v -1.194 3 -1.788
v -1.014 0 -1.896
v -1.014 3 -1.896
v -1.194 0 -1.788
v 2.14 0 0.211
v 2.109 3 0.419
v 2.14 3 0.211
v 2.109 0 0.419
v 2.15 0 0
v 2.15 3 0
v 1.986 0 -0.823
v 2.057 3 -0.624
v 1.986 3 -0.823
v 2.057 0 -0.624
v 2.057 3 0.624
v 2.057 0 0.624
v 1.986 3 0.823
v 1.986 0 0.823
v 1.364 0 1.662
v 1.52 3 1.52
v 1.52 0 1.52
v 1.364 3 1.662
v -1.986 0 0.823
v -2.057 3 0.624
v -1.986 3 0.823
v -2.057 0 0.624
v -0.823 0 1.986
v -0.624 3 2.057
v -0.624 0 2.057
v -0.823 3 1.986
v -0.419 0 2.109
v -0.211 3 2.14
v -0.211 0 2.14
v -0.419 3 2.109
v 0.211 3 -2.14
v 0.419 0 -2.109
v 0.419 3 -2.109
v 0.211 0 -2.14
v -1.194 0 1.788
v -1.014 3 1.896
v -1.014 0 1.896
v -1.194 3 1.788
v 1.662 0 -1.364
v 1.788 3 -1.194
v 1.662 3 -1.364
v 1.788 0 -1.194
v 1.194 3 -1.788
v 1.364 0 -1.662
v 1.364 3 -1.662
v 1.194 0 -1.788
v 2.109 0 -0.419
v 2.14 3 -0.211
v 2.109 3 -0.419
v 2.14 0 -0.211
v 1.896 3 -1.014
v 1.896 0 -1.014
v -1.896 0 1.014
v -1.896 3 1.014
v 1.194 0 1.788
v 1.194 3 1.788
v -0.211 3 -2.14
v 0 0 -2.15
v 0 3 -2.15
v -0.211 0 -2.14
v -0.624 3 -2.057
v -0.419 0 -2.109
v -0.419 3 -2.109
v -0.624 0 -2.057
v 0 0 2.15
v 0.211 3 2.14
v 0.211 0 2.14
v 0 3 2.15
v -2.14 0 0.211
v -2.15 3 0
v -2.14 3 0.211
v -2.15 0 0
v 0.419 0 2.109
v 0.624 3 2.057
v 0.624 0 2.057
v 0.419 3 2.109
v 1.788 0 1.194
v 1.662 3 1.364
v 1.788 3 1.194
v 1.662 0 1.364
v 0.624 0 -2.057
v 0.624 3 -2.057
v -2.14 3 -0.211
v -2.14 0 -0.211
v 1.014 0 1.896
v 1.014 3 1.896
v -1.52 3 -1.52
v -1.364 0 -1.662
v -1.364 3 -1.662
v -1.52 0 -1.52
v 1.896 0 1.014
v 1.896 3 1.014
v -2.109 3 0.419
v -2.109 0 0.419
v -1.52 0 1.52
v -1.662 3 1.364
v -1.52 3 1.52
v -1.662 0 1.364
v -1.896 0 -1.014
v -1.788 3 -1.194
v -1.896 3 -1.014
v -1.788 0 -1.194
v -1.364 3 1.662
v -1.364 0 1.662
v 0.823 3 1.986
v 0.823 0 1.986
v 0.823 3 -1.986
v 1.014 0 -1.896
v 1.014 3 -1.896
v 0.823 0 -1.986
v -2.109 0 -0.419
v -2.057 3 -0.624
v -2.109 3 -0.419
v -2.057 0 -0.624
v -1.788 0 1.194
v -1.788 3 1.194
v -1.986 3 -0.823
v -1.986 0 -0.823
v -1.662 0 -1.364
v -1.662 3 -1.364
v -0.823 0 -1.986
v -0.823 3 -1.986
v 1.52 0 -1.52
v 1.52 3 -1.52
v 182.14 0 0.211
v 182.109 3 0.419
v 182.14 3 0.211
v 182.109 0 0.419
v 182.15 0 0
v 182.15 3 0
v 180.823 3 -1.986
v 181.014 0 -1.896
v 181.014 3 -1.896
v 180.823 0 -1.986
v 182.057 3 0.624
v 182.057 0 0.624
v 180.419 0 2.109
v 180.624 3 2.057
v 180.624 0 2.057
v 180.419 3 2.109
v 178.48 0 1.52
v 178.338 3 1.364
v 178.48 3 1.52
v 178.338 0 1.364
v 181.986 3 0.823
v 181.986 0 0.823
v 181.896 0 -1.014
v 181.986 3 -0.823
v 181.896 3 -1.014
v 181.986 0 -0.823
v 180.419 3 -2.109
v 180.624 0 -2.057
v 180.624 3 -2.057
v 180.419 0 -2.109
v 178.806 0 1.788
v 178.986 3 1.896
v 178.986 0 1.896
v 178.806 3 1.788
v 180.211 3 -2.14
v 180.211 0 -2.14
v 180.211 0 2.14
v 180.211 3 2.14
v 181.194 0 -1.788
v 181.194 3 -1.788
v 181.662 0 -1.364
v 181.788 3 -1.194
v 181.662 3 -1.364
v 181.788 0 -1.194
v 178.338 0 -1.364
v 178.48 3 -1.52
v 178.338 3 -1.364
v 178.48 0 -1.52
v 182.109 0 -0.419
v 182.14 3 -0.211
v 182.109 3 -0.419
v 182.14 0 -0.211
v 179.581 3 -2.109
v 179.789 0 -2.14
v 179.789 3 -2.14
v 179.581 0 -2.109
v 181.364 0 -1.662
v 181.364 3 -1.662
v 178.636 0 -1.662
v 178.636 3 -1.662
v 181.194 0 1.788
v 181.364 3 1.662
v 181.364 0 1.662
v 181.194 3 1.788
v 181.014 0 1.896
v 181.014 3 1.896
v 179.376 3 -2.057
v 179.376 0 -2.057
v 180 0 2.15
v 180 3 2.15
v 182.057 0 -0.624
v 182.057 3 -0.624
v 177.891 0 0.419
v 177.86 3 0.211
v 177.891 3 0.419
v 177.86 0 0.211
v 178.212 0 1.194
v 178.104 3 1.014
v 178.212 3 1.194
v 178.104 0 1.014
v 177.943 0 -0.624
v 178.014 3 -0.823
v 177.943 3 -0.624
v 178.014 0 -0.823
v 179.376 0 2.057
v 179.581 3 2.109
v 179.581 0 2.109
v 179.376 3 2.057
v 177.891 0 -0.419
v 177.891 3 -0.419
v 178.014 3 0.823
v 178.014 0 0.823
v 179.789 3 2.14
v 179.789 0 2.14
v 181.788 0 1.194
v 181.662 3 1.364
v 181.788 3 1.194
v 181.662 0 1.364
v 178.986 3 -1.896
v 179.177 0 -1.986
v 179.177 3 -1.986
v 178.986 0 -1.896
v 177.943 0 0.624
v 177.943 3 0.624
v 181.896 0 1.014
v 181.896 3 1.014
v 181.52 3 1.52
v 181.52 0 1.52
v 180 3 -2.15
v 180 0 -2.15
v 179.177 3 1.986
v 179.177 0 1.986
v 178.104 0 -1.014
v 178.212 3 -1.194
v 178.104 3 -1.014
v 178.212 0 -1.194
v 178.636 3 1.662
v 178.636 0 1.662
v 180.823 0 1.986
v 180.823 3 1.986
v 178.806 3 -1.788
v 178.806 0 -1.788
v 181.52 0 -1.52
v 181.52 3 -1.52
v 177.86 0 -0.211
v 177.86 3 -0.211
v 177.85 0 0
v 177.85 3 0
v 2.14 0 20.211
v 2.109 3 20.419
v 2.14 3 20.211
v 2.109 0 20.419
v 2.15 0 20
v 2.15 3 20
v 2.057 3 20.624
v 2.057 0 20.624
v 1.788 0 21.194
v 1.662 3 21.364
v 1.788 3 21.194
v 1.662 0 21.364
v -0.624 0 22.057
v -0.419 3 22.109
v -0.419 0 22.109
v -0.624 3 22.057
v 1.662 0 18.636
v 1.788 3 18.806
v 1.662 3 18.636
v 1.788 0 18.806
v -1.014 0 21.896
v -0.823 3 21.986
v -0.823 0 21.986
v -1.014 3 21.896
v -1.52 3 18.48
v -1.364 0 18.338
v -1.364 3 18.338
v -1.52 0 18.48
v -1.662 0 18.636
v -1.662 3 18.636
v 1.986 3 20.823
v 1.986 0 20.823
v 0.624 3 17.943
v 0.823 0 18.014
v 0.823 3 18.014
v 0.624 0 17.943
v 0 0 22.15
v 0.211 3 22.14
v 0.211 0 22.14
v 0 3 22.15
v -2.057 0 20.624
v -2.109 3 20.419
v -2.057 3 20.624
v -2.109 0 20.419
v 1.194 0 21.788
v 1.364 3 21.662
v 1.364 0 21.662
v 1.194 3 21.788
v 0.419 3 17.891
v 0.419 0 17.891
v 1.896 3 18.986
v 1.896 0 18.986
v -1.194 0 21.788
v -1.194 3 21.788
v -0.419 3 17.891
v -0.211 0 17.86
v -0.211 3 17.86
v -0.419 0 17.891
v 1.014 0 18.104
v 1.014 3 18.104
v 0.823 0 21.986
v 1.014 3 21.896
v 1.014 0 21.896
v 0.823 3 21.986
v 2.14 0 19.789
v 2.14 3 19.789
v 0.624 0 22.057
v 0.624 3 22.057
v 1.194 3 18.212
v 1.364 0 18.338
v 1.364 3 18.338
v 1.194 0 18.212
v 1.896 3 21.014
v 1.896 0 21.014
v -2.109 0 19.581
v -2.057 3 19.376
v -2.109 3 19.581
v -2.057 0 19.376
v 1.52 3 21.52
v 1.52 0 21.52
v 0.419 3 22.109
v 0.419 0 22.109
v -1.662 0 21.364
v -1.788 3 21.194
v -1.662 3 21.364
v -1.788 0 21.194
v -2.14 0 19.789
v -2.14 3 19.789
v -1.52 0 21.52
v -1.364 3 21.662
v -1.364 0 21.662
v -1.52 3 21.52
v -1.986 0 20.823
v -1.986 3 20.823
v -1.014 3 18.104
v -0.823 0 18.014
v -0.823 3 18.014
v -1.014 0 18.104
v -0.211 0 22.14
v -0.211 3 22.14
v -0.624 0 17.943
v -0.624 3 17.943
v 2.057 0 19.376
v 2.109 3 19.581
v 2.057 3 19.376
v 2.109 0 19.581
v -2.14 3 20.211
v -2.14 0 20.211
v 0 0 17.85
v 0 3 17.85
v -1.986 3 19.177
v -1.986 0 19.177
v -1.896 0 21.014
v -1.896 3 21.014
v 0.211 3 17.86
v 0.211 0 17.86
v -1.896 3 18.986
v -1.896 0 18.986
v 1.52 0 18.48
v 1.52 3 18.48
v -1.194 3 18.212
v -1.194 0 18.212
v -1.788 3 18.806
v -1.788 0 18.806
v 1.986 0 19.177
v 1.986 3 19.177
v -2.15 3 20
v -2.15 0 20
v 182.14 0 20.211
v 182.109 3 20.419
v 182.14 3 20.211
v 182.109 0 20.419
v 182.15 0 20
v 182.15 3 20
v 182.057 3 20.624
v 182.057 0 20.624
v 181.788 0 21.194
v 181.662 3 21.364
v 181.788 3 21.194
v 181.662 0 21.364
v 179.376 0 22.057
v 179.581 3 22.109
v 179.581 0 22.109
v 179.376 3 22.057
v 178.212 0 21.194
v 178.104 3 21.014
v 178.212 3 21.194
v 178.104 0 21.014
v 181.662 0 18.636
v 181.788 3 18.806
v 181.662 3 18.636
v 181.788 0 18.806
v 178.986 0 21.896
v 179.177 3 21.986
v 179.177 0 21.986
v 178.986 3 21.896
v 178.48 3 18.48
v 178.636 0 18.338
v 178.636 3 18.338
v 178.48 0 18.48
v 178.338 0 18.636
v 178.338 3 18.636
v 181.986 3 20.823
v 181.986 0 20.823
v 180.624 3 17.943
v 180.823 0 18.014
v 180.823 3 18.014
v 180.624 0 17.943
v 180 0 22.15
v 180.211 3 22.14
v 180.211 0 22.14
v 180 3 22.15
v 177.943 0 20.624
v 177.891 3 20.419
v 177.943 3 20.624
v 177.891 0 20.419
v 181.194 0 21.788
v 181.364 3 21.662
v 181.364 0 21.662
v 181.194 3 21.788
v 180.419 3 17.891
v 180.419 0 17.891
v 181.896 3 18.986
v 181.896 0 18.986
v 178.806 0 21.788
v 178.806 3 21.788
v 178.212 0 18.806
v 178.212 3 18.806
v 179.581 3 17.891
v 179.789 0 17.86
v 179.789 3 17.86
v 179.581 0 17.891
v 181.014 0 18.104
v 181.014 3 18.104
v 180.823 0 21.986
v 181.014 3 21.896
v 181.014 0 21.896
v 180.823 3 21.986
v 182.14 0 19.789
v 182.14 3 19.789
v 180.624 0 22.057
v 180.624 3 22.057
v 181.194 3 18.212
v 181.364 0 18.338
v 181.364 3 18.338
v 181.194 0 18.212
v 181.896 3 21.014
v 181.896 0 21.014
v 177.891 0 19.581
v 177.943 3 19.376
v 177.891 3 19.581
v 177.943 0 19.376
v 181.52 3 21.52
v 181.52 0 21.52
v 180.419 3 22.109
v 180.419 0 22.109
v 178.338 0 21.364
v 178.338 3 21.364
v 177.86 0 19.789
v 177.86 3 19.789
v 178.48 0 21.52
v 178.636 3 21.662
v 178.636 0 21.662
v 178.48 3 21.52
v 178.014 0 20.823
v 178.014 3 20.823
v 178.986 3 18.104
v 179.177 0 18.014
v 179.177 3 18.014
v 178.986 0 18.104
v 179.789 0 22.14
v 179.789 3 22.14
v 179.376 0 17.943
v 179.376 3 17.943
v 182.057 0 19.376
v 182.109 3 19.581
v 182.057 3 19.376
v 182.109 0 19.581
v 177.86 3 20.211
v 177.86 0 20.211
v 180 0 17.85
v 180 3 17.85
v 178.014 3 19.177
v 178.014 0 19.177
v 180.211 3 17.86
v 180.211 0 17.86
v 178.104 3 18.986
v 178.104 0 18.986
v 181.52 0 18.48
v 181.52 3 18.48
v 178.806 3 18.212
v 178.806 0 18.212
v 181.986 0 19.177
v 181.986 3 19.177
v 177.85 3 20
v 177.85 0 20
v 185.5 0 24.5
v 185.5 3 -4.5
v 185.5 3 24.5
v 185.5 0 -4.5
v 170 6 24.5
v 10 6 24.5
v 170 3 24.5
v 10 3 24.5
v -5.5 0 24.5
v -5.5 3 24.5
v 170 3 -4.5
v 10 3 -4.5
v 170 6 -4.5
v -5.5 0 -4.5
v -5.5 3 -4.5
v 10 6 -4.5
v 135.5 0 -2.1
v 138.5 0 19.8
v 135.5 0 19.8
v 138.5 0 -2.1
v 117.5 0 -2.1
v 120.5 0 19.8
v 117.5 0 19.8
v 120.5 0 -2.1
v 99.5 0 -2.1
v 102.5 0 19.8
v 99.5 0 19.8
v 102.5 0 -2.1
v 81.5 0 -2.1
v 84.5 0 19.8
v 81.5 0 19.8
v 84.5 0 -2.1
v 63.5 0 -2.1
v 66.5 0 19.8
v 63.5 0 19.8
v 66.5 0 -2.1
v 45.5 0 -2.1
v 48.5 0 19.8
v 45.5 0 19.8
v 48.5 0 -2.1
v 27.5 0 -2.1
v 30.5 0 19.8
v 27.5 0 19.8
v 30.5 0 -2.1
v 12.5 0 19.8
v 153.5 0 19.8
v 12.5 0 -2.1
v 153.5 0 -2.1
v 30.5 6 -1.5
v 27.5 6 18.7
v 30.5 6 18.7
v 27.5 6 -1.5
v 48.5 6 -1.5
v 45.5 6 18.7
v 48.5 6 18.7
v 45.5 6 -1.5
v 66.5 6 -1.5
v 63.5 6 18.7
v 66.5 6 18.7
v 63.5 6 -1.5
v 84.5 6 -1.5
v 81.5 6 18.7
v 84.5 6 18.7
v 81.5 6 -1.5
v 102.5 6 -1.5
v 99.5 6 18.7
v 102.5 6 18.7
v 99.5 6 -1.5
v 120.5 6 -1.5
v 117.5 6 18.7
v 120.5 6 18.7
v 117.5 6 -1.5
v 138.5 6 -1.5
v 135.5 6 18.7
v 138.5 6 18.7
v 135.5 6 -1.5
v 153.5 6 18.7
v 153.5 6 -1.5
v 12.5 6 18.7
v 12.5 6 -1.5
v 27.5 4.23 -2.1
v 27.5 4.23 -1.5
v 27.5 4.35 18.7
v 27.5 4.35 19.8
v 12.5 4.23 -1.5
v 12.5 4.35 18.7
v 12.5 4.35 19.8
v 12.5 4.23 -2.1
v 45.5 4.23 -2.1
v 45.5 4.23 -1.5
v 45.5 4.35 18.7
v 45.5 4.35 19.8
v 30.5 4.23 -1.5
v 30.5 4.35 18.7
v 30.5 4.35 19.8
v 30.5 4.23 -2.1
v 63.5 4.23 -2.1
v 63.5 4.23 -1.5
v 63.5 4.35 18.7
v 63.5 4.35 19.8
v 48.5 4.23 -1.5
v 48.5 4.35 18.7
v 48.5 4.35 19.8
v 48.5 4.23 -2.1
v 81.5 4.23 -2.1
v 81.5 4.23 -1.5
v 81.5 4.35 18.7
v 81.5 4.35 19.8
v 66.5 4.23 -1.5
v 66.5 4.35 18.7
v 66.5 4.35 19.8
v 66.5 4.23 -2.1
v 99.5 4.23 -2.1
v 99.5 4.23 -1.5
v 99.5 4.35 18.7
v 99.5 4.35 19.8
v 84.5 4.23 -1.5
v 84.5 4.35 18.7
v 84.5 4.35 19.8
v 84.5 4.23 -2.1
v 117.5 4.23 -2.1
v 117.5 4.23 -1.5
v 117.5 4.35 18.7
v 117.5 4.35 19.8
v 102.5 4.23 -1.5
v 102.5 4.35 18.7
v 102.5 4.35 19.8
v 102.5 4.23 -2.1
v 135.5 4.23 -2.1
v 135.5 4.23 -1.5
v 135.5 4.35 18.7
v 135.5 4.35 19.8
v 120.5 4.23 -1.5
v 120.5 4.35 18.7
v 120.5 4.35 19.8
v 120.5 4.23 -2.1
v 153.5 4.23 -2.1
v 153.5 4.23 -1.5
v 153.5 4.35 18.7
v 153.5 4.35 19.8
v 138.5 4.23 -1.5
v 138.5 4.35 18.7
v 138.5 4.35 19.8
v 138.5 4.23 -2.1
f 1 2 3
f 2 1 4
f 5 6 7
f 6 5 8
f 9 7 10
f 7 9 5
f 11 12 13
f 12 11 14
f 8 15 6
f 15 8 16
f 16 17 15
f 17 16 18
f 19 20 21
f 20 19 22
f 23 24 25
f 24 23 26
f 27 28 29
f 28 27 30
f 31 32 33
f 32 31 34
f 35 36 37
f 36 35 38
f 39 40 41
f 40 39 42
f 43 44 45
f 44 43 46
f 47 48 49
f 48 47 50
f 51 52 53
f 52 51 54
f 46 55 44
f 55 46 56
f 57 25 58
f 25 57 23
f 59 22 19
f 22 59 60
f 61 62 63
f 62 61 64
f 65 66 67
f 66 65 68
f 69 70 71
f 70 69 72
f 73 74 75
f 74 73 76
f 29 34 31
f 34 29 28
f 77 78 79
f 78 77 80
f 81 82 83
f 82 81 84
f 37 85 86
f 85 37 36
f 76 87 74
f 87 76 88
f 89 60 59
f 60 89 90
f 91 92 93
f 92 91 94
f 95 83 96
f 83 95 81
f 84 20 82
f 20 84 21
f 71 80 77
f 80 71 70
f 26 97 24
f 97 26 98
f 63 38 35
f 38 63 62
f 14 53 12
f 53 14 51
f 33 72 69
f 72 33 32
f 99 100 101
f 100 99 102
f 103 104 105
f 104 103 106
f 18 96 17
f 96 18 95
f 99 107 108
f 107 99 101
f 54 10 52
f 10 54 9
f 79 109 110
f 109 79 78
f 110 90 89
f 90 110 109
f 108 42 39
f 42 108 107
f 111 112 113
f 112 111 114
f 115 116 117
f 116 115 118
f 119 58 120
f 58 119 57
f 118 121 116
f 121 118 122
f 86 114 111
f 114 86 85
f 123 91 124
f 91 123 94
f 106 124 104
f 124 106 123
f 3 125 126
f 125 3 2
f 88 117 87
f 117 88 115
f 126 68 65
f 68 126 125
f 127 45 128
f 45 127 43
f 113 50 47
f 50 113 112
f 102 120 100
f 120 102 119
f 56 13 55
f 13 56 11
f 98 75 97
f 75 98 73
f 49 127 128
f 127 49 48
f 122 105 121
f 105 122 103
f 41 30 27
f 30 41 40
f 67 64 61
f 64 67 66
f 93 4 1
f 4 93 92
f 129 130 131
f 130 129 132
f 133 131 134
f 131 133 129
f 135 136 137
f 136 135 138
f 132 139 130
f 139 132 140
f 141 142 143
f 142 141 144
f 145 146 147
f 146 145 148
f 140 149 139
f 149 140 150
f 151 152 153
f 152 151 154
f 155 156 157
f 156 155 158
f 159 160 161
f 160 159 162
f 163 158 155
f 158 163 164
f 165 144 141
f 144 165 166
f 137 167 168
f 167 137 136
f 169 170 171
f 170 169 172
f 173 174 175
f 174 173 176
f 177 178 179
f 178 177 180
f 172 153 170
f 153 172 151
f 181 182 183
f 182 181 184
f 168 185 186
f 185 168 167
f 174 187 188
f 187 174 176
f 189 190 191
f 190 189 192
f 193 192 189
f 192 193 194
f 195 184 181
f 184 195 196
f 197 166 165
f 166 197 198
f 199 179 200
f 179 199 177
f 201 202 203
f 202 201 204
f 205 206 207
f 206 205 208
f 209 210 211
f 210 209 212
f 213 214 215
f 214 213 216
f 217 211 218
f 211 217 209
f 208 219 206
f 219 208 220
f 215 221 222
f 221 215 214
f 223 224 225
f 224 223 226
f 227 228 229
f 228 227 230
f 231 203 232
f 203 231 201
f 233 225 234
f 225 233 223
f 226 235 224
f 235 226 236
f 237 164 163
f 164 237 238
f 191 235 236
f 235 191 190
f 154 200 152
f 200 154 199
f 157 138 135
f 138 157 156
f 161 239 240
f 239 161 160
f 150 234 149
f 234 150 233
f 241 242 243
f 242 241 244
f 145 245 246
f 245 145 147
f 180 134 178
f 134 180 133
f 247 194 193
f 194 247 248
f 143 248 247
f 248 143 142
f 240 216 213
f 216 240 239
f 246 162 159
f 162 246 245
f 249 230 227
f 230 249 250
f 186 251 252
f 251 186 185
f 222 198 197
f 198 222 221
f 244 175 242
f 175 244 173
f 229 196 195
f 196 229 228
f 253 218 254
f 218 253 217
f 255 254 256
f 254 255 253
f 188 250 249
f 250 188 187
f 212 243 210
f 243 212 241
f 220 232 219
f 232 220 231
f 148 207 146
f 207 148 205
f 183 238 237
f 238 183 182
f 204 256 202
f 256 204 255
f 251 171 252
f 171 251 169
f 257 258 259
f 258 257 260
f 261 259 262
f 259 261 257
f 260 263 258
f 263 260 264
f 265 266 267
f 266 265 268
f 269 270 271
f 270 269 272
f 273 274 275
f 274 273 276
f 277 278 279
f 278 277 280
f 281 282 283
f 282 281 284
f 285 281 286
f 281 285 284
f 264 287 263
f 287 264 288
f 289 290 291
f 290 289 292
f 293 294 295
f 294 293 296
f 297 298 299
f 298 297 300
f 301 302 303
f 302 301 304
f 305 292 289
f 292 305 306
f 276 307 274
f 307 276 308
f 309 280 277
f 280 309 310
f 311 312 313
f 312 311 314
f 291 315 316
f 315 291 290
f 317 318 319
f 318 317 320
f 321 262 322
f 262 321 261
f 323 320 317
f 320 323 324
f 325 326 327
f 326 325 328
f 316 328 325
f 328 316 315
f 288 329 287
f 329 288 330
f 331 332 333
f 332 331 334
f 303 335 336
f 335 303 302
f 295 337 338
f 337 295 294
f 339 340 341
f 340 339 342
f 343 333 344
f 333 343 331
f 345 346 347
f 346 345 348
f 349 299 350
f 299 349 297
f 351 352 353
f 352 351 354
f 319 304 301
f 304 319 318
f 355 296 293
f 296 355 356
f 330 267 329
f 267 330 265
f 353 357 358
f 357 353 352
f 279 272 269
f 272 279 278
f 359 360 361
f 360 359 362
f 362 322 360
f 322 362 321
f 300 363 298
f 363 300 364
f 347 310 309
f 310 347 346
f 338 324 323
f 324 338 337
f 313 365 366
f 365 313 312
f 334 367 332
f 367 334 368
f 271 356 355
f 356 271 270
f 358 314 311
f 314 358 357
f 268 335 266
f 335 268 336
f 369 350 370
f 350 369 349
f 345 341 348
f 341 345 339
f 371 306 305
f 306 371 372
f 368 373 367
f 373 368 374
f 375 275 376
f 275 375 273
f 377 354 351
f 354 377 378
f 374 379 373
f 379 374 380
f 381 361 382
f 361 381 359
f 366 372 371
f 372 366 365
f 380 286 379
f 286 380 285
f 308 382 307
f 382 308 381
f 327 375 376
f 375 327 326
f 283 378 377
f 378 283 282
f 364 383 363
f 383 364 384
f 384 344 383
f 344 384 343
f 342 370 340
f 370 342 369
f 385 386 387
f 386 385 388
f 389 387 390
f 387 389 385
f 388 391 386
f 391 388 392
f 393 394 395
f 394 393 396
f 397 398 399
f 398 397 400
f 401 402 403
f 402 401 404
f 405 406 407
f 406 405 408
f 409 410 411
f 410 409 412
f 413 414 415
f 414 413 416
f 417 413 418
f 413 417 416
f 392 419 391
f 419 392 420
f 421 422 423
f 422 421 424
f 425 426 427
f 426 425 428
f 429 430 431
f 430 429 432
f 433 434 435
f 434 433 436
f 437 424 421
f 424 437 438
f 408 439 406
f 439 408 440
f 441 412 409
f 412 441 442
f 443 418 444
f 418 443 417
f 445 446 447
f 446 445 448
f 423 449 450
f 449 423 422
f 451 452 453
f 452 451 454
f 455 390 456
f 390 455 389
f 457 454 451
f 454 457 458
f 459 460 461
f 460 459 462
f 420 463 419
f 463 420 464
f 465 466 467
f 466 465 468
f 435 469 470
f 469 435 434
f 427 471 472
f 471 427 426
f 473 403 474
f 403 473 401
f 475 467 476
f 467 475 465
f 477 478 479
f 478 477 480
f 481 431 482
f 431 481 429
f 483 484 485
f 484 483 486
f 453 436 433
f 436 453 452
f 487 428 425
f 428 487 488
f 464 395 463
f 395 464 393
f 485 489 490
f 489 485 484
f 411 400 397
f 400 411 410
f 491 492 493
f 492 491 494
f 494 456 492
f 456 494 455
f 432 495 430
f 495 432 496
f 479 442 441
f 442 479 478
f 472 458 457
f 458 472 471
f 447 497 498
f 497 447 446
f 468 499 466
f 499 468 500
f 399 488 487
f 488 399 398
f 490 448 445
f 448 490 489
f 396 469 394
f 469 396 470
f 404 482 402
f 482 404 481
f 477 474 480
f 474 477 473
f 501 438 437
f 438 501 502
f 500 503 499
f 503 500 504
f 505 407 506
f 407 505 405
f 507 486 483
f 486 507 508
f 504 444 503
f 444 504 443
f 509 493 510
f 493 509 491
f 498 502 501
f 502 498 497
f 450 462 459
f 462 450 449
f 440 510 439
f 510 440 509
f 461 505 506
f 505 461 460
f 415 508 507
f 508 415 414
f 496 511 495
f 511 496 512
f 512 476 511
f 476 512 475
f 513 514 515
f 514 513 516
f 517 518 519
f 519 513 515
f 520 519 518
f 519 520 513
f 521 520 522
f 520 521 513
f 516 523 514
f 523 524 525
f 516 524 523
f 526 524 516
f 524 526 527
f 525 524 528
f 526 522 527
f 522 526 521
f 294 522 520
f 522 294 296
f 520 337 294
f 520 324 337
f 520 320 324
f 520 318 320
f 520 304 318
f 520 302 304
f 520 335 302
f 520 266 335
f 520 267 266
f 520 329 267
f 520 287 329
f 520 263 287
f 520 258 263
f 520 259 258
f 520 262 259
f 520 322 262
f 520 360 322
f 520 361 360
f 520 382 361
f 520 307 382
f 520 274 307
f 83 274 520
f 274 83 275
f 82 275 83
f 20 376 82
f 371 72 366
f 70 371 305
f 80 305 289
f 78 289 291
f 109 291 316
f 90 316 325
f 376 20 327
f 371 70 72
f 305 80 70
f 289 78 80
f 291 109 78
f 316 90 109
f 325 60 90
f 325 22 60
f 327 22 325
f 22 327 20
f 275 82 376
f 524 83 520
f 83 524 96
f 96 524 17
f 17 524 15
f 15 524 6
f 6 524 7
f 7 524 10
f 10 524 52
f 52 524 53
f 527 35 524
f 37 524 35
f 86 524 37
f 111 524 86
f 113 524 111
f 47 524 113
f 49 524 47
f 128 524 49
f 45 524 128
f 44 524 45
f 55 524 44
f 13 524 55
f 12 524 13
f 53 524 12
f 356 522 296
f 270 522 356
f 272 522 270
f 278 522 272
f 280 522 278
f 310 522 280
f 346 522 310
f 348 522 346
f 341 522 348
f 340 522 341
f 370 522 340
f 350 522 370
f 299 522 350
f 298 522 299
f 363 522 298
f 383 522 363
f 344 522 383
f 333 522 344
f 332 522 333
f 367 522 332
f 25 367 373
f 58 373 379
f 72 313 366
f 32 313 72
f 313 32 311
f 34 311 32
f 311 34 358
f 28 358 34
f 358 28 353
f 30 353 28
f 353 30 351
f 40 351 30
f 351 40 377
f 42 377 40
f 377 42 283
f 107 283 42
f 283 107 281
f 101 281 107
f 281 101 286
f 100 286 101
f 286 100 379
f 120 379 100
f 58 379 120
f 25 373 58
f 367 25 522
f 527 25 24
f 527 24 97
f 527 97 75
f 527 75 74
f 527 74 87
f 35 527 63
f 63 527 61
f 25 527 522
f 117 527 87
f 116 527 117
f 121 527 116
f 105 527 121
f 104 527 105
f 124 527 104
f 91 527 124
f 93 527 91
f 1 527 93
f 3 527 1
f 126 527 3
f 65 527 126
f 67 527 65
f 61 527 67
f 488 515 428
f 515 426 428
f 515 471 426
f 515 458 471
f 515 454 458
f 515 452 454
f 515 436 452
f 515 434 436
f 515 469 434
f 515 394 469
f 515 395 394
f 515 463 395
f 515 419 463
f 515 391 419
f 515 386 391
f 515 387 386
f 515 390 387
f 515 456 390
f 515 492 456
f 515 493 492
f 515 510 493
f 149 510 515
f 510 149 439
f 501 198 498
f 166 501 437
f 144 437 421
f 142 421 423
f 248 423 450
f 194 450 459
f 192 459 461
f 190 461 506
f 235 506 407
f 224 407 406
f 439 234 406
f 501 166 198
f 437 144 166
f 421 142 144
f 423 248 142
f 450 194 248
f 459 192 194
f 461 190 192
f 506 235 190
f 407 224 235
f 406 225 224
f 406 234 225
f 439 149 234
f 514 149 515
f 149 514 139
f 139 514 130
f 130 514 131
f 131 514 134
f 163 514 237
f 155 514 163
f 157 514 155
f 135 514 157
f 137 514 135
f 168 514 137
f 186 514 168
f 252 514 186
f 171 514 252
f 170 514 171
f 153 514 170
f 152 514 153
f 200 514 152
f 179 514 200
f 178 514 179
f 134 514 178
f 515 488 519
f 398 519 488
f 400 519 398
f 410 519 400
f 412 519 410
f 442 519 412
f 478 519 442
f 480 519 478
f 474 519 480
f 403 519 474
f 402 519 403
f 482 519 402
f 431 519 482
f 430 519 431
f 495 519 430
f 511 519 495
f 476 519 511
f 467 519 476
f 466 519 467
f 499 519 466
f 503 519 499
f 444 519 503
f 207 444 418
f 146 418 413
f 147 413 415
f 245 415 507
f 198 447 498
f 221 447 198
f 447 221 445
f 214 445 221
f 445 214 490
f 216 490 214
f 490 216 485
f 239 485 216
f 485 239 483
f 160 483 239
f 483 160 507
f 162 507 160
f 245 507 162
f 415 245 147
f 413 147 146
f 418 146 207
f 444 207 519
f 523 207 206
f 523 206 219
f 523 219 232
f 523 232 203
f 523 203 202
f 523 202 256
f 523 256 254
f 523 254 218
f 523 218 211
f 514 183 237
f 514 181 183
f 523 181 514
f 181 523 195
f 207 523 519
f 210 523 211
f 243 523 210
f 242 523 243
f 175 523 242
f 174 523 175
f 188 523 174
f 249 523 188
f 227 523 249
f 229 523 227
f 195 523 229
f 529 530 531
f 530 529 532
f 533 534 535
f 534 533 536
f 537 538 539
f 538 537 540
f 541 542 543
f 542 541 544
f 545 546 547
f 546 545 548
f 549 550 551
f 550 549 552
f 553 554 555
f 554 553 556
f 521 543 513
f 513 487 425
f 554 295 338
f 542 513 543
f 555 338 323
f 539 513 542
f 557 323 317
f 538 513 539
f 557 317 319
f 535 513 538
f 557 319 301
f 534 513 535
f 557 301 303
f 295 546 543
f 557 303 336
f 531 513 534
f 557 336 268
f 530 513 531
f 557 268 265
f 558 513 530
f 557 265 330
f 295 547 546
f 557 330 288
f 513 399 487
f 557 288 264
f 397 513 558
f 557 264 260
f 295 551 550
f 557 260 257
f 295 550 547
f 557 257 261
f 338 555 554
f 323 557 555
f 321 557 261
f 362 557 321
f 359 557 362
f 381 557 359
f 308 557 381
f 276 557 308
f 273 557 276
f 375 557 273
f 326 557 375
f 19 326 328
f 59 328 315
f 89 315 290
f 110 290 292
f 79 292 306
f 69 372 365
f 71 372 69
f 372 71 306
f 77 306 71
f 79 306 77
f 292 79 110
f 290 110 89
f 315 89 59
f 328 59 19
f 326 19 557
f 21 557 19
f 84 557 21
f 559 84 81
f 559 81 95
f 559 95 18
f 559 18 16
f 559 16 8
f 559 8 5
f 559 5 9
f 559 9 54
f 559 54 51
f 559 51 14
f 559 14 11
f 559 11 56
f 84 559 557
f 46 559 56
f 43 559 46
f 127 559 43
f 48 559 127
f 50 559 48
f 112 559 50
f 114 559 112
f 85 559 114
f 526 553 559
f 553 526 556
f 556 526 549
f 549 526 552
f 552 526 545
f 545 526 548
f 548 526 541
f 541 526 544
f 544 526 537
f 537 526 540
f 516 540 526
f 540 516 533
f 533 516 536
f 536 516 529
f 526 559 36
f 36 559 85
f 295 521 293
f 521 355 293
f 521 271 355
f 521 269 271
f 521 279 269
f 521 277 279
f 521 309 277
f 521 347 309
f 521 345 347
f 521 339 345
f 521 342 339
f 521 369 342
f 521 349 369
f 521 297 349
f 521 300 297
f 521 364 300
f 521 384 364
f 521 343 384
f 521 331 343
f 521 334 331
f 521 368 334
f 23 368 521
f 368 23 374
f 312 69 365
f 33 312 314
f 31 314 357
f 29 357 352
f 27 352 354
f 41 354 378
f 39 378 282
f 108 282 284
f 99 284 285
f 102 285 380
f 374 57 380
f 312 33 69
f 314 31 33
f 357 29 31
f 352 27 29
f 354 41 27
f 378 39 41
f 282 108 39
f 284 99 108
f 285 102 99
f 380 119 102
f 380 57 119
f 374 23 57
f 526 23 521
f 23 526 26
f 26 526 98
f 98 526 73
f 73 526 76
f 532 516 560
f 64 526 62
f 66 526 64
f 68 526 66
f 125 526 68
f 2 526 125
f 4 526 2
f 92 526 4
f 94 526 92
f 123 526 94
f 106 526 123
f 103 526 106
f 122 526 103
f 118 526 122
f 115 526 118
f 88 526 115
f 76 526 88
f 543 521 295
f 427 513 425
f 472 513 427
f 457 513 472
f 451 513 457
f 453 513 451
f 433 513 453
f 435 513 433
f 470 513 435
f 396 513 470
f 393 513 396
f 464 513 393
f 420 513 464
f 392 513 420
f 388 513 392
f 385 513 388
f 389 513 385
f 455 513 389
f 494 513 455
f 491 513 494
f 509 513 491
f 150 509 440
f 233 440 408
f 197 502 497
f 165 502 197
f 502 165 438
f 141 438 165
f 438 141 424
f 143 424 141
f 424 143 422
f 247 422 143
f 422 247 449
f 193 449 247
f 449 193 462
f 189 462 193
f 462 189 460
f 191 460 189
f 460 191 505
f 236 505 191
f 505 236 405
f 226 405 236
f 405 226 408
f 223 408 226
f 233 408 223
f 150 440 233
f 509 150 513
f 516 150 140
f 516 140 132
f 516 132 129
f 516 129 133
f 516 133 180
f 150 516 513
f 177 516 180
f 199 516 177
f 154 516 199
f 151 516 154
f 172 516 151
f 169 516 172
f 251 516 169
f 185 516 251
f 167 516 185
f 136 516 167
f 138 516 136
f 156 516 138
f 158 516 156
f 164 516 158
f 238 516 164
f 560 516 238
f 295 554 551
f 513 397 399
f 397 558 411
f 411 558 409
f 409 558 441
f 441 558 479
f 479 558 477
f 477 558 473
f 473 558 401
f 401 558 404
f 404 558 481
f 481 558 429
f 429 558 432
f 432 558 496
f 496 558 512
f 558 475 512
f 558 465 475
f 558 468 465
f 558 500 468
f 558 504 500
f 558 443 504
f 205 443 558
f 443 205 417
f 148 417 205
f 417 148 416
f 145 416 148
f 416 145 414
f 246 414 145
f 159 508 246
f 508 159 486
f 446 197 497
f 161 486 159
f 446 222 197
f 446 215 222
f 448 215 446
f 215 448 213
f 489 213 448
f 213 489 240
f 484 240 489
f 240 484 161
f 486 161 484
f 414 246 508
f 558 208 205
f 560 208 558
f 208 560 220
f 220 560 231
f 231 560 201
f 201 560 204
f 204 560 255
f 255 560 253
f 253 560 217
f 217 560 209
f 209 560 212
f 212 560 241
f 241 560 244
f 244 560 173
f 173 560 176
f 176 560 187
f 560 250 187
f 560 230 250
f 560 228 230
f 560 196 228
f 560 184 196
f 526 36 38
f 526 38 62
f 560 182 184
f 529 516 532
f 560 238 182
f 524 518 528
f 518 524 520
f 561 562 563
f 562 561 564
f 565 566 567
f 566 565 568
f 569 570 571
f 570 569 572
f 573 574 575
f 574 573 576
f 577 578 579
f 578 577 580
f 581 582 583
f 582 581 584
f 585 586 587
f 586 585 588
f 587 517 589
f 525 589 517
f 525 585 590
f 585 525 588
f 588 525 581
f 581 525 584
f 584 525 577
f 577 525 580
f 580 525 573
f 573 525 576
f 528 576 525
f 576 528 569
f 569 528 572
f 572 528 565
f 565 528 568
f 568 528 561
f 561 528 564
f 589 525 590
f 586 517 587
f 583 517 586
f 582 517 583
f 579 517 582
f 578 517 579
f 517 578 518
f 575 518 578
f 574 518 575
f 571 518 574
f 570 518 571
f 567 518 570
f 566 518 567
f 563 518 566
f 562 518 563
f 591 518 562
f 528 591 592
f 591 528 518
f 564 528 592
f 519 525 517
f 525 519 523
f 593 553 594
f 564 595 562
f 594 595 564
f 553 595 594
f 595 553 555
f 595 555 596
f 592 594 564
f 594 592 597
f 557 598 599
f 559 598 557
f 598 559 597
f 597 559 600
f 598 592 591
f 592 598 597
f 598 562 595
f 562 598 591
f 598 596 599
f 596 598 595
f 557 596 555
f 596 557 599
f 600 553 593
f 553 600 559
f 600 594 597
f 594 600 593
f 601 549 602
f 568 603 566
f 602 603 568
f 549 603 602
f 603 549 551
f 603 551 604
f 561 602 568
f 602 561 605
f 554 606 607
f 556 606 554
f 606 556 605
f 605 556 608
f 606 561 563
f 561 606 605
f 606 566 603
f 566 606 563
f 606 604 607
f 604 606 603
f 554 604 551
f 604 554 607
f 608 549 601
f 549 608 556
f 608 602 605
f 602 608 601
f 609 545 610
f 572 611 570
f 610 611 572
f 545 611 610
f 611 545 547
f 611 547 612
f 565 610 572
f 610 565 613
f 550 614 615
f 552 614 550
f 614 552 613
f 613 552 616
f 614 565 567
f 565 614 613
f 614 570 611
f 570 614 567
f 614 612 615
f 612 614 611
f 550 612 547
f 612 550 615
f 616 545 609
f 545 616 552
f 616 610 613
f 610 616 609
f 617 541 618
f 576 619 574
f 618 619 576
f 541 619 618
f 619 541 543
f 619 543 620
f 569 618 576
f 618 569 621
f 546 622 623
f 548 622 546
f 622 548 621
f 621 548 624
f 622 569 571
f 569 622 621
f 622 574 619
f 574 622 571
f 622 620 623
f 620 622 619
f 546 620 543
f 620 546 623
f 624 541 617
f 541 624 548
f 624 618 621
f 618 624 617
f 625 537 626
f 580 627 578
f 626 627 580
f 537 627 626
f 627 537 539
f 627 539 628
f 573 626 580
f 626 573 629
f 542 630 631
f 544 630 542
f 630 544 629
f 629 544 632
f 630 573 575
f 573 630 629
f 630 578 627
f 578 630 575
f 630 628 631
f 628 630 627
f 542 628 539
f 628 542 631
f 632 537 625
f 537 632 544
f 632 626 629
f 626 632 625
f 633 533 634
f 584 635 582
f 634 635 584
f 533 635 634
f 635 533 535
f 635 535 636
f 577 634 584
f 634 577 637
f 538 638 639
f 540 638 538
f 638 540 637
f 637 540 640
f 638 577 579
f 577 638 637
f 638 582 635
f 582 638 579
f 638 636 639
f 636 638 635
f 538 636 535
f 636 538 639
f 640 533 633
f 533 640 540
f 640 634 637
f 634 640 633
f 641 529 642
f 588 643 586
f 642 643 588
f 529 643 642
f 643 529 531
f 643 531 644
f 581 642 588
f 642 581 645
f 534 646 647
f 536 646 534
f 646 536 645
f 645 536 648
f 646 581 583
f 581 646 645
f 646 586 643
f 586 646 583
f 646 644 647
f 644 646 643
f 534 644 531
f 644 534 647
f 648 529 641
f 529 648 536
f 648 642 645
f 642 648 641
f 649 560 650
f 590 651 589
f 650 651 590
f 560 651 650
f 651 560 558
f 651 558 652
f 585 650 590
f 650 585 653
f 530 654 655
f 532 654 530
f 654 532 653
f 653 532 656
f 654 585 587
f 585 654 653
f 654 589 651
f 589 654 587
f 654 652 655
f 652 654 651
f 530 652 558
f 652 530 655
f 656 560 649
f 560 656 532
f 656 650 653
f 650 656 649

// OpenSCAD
// file: rack/screws.scad
/* Some common screw dimensions */


inf = 400; // basically infinity

/********************************************************************************/
// M3 dimensions

m3HoleRadiusSlack = 0.15;
m3Diameter = 3.0;
m3Radius = m3Diameter/2.0;

m3RadiusSlacked = m3Radius + m3HoleRadiusSlack;

// legacy TODO: replace
m3ptr = m3RadiusSlacked;

// NUTS!
m3HexNutWidthAcrossFlats = 5.41;
m3HexNutWidthAcrossCorners = FtoG(m3HexNutWidthAcrossFlats);

m3HexNutThickness = 2.18;

module m3HexNutPocketNegative() {
  hexNutPocketNegative(m3RadiusSlacked,
                       m3HexNutWidthAcrossCorners/2 + 0.1,
                       m3HexNutThickness + 0.2);
}


// TODO: remove test

*difference() {
  cube(size=[8,12,5], center=true);

  rotate(a=[0,0,20])
  m3HexNutPocketNegative();
}

*m3HexNutPocketNegative();


/********************************************************************************/
// M4 dimensions

m4HoleRadiusSlack = 0.15;
m4Diameter = 4.0;
m4Radius = m4Diameter/2.0;
m4RadiusSlacked = m4Radius + m4HoleRadiusSlack;

m4HexNutWidthAcrossFlats = 6.89;
m4HexNutWidthAcrossCorners = FtoG(m4HexNutWidthAcrossFlats);

m4HexNutThickness = 3.07;

module m4HexNutPocketNegative() {
  hexNutPocketNegative(m4RadiusSlacked,
                       m4HexNutWidthAcrossCorners/2 + 0.1,
                       m4HexNutThickness + 0.2);
}


// TODO: remove test

*difference() {
  translate(v=[0,1,0])
  cube(size=[10,12,6], center=true);

  rotate(a=[0,0,20])
  m4HexNutPocketNegative();
}

*m4HexNutPocketNegative();

/********************************************************************************/

// Convert a regular hexagon widthAcrossFlats to widthAcrossCorners
function FtoG(widthAcrossFlats) = widthAcrossFlats * (2/sqrt(3));  

// Convert a regular hexagon widthAcrossCorners to widthAcrossFlats
function GtoF(widthAcrossCorners) =  widthAcrossCorners * (sqrt(3)/2);


module hexNutPocketNegative(
  innerRadius,
  widthAcrossCorners,
  thickness)
{

  union() {

    hull() {
      // hexagonal cylinder representing where the nut should fit
      cylinder(r=widthAcrossCorners, h=thickness, center=true, $fn=6);

      // negative volume for sliding in the nut
      translate(v=[inf,0,0])
      cylinder(r=widthAcrossCorners, h=thickness, center=true, $fn=6);
    }

    // negative volume for screw lead
    translate(v=[0,0,-10])
    cylinder(r=innerRadius, h = inf, $fn=32);

    hull() {
     translate(v=[inf,0,0])
       cylinder(r=innerRadius, h = inf, $fn=32);
     cylinder(r=innerRadius, h = inf, $fn=32);
    }
  }
}
// file: common.scad
/* Some initial configurations and commonly used variables
   plus functions
*/

$fn=64;


eps=0.01;

inf10 = 10;
inf50 = 50;
inf1000 = 1000;
inf = inf1000;
// main file
include <./common.scad>
include <./rack/screws.scad>

vU = 2;
uHeight = 10;

plateScrewDiffV = uHeight*vU;
plateScrewDiffH = 180;

plateScrewToHEdge = 4.5;
plateScrewToVEdge = 5.5;

frontPlateThickness = 3;

frontPlateV = plateScrewDiffV + 2*plateScrewToHEdge;
frontPlateH = plateScrewDiffH + 2*plateScrewToVEdge;


plateScrewToBoxMin = 6;

module _frontPlateBody() {
  translate(v=[-plateScrewToVEdge,0,-plateScrewToHEdge])
    cube(size=[frontPlateH,frontPlateThickness,frontPlateV]);
}

module _plateHole() {
  rotate(a=[90,0,0])
    cylinder(r=m4RadiusSlacked, h=inf, center=true);
}


module frontPlate() {

  difference() {
    _frontPlateBody();

    union() {
      // TODO: introduce helper modules for this pattern
      _plateHole();

      translate(v=[plateScrewDiffH,0,0])
        _plateHole();

      translate(v=[0,0,plateScrewDiffV])
        _plateHole();

      translate(v=[plateScrewDiffH,0,plateScrewDiffV])
        _plateHole();
    }
  }
}

// keystone stuff

// a lot of these variables are useless, after a couple of design iterations

keystoneMainBodyWidth = 15.0;
keystoneMainBodyHeight = 16.90;
keystoneMainBodyDepth = 32.90;


heightWithHookBody = 20.2;
heightWithHookCatch = 21.30;

widthWithSideLugs = 15.96;

sideLugWidth = (widthWithSideLugs - keystoneMainBodyWidth) / 2.0;


heightWithBottomLug = 17.5;

frontToHookCatch = 8.35; // not sure about this
frontToBottomLugBack = 8.23;
frontToSideLugFront = 10.63;


module keystoneSlot_N() {
  // main keystone body (no hooks or lugs)
  cube(size=[keystoneMainBodyWidth, keystoneMainBodyDepth, keystoneMainBodyHeight]);


  // slot for top hook
  translate(v=[0,frontToHookCatch,0])
  cube(size=[keystoneMainBodyWidth, keystoneMainBodyDepth -frontToHookCatch, heightWithHookBody]);
  cube(size=[keystoneMainBodyWidth, frontToHookCatch, heightWithHookCatch]);


  // slots for side lugs
  translate(v=[-sideLugWidth, frontToSideLugFront,0])
  cube(size=[widthWithSideLugs, keystoneMainBodyDepth-frontToSideLugFront, keystoneMainBodyHeight]);

  // slots for bottom lugs
  translate(v=[0,0,-(heightWithBottomLug-keystoneMainBodyHeight)])
  cube(size=[keystoneMainBodyWidth, frontToBottomLugBack, keystoneMainBodyHeight]);
  
}


module keystoneJack_N() {
  translate(v=[0,-4,0.5])
  intersection() {
    translate(v=[-2.5,4,-4])
      cube(size=[20,6,28]);
    keystoneSlot_N();
  }
}

//keystoneJack_N();

module patchPanel_P() {
  
  frontPlate();
  for (i = [0:7]) {
    translate(v=[(i*20+12.5)-2.5,0,-4.5])
      cube(size=[20,6,29]);
  } 

}


module patchPanel() {
  difference() {
    patchPanel_P();

    for (i = [0:7]) {
      translate(v=[i*18 + 12.5,0,-2])
      keystoneJack_N();
  } 
  }
}

patchPanel();
